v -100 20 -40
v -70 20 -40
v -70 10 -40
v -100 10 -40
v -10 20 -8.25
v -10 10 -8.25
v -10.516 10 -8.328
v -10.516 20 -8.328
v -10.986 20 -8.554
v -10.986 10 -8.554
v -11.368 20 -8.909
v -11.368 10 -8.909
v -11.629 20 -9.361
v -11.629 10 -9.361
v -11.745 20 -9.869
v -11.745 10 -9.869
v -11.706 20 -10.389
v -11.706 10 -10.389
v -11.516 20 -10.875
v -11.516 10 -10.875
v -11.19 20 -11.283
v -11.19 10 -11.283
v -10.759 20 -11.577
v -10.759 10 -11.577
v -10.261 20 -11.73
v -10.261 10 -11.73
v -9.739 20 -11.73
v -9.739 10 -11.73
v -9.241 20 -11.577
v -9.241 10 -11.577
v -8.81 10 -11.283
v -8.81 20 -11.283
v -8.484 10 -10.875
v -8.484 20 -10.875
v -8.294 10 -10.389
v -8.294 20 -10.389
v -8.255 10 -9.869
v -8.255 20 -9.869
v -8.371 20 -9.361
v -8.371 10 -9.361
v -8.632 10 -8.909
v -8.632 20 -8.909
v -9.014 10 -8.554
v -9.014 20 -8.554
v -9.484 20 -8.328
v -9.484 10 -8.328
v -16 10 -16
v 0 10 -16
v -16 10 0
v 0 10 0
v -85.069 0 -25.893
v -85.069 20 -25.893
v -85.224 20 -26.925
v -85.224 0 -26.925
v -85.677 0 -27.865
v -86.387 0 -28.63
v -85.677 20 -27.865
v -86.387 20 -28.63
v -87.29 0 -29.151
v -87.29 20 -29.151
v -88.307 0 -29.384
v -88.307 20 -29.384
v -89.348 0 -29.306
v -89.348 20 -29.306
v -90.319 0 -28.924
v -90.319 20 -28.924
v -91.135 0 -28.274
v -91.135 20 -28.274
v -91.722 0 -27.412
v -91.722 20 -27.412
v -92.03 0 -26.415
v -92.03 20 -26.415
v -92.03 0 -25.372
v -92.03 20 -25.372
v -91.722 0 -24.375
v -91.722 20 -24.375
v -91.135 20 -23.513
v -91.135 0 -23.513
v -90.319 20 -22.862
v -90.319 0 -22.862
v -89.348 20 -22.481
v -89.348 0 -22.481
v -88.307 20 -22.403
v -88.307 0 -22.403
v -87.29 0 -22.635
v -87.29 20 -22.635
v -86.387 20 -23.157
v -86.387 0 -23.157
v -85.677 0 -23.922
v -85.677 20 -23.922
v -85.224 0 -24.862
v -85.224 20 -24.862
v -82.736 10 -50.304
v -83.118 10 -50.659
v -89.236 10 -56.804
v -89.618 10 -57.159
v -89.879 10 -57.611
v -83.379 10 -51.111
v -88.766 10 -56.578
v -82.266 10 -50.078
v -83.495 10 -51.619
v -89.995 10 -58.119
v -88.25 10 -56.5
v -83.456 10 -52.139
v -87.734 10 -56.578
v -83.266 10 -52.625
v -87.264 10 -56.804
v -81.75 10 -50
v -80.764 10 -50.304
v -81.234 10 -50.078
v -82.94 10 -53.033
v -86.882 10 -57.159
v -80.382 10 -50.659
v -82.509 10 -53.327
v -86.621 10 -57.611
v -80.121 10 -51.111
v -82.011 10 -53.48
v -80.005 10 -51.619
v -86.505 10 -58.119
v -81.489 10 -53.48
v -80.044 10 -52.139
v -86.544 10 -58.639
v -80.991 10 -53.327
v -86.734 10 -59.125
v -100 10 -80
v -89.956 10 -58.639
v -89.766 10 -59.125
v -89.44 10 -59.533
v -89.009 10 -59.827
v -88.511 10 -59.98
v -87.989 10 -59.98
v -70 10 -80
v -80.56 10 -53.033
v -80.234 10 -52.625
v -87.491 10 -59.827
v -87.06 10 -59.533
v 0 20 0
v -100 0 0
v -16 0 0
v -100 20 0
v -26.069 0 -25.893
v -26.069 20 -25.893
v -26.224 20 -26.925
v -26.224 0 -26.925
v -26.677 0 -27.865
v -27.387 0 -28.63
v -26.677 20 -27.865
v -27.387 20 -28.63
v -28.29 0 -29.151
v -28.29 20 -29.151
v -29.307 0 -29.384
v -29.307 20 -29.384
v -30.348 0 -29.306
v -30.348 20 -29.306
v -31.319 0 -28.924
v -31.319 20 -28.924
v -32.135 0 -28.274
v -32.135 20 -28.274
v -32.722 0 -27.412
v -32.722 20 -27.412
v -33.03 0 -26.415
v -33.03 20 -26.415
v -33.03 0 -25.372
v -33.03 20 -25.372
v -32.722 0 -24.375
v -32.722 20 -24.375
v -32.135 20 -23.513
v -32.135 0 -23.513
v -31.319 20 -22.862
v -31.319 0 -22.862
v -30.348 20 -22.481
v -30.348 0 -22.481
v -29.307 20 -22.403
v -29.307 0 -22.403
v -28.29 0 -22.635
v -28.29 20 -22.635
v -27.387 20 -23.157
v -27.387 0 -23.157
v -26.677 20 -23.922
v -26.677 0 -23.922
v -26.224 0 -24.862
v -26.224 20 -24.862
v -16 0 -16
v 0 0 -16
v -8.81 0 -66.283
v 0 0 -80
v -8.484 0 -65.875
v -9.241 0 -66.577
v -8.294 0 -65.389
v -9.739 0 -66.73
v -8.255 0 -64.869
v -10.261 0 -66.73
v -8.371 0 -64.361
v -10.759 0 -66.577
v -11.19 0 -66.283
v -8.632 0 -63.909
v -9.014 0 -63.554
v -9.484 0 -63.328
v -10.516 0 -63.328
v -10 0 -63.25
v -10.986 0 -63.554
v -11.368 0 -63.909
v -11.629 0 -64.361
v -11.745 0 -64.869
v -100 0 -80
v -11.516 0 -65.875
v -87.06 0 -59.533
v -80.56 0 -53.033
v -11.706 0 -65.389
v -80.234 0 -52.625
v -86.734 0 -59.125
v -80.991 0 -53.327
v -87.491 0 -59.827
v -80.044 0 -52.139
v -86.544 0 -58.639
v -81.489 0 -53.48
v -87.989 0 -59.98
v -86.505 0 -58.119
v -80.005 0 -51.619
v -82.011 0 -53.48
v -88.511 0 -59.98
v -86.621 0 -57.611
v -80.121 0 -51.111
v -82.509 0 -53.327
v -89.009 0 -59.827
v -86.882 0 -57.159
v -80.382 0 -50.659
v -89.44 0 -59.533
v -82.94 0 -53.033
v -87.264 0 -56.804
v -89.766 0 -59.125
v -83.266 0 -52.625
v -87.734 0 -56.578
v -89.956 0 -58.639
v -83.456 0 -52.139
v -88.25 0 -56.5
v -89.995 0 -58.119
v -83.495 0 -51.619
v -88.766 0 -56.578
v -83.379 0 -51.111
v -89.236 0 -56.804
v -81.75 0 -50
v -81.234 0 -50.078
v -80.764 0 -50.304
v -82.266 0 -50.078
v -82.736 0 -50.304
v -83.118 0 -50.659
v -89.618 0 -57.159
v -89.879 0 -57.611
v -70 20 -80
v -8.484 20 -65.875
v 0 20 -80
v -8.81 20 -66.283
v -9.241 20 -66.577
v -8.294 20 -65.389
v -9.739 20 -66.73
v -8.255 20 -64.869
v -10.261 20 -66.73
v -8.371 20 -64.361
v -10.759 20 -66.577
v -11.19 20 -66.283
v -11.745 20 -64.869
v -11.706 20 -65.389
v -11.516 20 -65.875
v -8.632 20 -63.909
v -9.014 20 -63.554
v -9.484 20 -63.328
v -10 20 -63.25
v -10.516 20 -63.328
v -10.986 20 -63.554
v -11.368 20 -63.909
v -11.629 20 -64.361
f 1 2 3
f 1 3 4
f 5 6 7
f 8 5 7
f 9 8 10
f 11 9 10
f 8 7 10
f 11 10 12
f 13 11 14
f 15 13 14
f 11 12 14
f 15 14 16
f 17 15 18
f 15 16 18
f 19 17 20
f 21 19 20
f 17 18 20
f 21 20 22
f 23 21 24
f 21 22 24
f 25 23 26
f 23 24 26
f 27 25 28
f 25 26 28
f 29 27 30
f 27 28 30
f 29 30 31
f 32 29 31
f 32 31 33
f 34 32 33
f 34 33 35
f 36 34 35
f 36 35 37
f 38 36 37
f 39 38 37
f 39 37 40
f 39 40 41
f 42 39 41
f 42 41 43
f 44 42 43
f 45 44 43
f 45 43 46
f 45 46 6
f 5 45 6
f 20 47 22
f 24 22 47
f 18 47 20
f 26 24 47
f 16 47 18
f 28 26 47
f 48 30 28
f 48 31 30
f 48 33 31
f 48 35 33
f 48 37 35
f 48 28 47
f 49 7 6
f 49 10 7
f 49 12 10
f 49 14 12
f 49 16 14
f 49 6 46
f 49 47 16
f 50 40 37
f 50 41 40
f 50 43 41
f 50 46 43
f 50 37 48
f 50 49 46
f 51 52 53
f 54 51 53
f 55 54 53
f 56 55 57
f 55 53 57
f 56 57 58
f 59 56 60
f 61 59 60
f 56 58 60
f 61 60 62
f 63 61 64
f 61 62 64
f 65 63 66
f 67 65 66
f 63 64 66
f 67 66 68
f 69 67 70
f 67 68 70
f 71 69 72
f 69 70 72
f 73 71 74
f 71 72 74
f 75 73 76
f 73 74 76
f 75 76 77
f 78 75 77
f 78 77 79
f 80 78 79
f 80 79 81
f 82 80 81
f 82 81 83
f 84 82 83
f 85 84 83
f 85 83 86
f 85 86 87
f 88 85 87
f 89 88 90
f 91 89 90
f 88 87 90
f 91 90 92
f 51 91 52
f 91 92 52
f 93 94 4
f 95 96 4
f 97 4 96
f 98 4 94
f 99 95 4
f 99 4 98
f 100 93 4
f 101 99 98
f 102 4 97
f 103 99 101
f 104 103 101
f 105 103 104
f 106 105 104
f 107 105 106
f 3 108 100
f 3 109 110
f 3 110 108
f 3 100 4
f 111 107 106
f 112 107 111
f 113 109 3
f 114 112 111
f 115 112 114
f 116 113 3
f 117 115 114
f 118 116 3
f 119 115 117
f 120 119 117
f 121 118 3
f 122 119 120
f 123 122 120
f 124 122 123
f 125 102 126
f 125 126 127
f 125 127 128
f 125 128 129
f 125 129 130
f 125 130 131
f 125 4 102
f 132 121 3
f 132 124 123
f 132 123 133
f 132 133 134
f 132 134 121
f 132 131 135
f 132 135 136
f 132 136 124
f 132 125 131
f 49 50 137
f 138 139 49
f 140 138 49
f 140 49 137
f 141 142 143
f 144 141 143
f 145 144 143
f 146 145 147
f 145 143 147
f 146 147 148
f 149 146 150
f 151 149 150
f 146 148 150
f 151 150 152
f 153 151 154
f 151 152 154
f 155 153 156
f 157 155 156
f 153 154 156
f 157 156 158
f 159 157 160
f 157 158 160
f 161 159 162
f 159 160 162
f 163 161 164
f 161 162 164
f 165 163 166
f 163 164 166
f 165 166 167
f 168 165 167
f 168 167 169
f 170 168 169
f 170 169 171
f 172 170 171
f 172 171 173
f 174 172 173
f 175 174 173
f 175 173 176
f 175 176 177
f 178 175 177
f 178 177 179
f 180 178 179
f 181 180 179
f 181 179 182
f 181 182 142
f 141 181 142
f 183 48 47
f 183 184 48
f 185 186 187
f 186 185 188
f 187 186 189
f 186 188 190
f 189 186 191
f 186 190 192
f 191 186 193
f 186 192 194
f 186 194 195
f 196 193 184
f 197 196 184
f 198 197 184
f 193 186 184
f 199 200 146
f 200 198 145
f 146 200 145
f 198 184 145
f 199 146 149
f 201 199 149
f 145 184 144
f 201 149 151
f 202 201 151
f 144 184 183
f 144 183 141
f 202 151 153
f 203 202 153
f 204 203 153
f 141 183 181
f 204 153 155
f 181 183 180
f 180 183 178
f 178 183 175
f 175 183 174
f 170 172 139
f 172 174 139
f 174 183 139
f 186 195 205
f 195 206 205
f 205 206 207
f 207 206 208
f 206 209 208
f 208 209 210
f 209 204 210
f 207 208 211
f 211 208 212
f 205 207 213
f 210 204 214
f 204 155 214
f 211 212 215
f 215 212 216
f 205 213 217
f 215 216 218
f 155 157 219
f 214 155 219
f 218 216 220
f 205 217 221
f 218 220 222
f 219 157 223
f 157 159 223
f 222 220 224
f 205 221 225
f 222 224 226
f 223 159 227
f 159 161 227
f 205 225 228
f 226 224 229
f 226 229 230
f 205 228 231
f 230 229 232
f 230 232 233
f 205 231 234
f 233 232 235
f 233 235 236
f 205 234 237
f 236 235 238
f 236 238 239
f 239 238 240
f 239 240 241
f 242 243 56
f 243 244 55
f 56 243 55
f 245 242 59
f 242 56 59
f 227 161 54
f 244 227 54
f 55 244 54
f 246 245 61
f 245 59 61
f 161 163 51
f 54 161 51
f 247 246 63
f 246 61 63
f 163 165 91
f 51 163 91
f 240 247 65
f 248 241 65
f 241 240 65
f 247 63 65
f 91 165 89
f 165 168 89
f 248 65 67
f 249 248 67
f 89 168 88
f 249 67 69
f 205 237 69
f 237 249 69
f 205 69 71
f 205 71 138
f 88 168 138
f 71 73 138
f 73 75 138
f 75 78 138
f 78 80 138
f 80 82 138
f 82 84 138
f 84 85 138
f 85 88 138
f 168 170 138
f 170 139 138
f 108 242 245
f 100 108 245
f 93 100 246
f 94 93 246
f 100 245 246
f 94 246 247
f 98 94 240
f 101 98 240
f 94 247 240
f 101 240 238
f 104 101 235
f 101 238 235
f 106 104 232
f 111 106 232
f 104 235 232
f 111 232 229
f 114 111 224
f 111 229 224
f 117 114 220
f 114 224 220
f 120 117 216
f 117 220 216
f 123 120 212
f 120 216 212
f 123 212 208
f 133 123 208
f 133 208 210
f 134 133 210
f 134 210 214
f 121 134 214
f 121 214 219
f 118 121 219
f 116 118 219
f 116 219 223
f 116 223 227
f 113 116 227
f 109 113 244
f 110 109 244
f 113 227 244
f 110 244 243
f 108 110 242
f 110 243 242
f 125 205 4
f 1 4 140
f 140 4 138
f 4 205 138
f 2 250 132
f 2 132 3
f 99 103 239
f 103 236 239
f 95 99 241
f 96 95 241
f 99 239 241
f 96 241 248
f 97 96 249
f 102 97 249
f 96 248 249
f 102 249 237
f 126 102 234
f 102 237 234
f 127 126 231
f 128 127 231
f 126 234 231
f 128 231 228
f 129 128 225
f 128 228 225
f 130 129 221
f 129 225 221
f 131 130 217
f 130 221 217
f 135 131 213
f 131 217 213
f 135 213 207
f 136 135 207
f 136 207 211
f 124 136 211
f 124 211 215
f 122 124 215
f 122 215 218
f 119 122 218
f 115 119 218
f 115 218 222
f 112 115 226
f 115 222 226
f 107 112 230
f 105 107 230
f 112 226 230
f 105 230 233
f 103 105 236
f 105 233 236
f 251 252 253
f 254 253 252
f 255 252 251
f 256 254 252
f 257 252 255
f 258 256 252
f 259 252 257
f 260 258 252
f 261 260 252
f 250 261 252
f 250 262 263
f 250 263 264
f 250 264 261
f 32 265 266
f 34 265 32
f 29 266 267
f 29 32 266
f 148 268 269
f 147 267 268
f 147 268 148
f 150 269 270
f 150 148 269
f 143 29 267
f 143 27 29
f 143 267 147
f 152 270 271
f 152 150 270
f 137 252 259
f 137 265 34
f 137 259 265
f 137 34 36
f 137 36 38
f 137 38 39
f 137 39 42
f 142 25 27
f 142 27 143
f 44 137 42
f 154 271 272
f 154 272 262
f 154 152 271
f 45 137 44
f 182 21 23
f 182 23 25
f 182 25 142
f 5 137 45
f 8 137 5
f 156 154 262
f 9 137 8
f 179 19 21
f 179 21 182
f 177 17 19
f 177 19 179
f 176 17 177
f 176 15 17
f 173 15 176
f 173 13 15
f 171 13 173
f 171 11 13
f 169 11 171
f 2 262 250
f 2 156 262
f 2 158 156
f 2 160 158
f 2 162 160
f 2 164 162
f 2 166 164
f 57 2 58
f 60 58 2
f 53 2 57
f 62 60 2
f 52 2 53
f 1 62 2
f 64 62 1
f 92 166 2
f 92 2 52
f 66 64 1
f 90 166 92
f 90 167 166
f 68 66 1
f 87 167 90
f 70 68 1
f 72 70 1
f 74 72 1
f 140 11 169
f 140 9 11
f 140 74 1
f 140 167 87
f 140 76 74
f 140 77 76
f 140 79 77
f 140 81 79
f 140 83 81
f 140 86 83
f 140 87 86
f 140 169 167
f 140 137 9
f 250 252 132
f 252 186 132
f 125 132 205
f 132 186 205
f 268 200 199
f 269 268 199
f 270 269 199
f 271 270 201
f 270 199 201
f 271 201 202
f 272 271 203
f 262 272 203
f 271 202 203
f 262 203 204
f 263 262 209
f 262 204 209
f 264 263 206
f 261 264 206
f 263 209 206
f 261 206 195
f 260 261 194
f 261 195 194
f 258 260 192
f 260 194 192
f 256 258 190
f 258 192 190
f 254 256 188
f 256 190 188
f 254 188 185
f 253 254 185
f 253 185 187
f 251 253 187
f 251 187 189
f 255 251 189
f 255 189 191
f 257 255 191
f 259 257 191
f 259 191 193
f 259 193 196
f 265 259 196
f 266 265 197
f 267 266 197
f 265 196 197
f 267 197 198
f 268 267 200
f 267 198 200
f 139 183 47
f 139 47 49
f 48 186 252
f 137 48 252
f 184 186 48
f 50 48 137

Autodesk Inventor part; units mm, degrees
ref_plane "YZ Plane" through (0, 0, 0) normal (1, 0, 0) x (0, 1, 0)
ref_plane "XZ Plane" through (0, 0, 0) normal (0, 1, 0) x (-1, 0, 0)
ref_plane "XY Plane" through (0, 0, 0) normal (0, 0, 1) x (1, 0, 0)
sketch "Boceto1" plane through (0, 0, 0) normal (0, 1, 0) x (-1, 0, 0)
  line L0 (100, 80) -> (-100, 80)
  line L1 (-100, 80) -> (-100, -80)
  line L2 (-100, -80) -> (100, -80)
  line L3 (100, -80) -> (100, 80)
  line L4 (100, 80) -> (-100, -80) construction
  line L5 (-100, 80) -> (100, -80) construction
  point P0 (0, 0)
  dimension "d0" = 200
  dimension "d1" = 160
extrude "Extrusión1" add sketch "Boceto1" along normal blind 20
sketch "Boceto2" plane through (0, 20, 0) normal (0, 1, 0) x (1, 0, 0)
  line L0 (-100, 80) -> (-100, -80) projected
  line L1 (-100, 80) -> (-70, 80)
  line L2 (-70, 80) -> (-70, 40)
  line L3 (-70, 40) -> (-100, 40)
  line L4 (-100, 40) -> (-100, 80)
  line L5 (100, 80) -> (-100, 80) projected
  line L6 (0, 80) -> (0, 40)
  line L7 (100, 80) -> (70, 80)
  line L8 (70, 80) -> (70, 40)
  line L9 (70, 40) -> (100, 40)
  line L10 (100, 40) -> (100, 80)
  point P0 (0, 0)
  dimension "d4" = 30
  dimension "d5" = 40
extrude "Extrusión2" cut sketch "Boceto2" against normal blind 10
sketch "Boceto3" plane through (0, 20, 0) normal (0, 1, 0) x (1, 0, 0)
  line L0 (-70, 80) -> (-70, 40) projected
  line L1 (-70, 80.0001) -> (-70, 40)
  line L2 (-70, 40) -> (-100, 40) projected
  line L3 (-100, 40) -> (-100, 80.0001)
  line L4 (-100, 40) -> (-70, 40)
  line L5 (-70, 40) -> (-70, 80)
  line L6 (-70, 80) -> (-100, 80)
  line L7 (-100, 80) -> (-100, 40)
  circle A0 centre (-88.25, 58.25) radius 1.75
  circle A1 centre (-81.75, 51.75) radius 1.75
  line L8 (100, 80) -> (-100, 80) projected
  line L9 (0, 80) -> (0, 56.5)
  circle A2 centre (88.25, 58.25) radius 1.75
  circle A3 centre (81.75, 51.75) radius 1.75
  point P0 (0, 0)
  point P1 (-64.3507, 80)
  point P2 (-74.3507, 0)
  point P3 (-85, 80)
  dimension "d23" = 21.75
  dimension "d24" = 11.75
  dimension "d26" = 11.75
hole "Agujero1" at (-81.75, 20, -51.75) at (-88.25, 20, -58.25) at (81.75, 20, -51.75) at (88.25, 20, -58.25) direction (0, -1, 0) diameter 3.5 end through all
sketch "Boceto4" plane through (-100, 0, 80) normal (0, 0, 1) x (1, 0, 0)
  line L0 (30, 20) -> (60, 20)
  line L1 (60, 20) -> (60, 10)
  line L2 (60, 10) -> (30, 10)
  line L3 (30, 10) -> (30, 20)
  line L4 (0, 0) -> (0, 20) projected
  line L5 (100, 0) -> (100, 10)
  line L6 (170, 20) -> (140, 20)
  line L7 (140, 20) -> (140, 10)
  line L8 (140, 10) -> (170, 10)
  line L9 (170, 10) -> (170, 20)
  dimension "d34" = 30
  dimension "d35" = 10
  dimension "d36" = 30
extrude "Extrusión3" add sketch "Boceto4" along normal blind 40
sketch "Boceto5" plane through (0, 20, 0) normal (0, 1, 0) x (1, 0, 0)
  line L0 (59.9999, -50) -> (69.9999, -50)
  line L1 (49.9999, -101.75) -> (49.9999, -79.9497)
  line L2 (59.9999, -108.25) -> (59.9999, -50)
  line L3 (40, -80) -> (69.9999, -80)
  line L4 (49.9999, -79.9497) -> (40, -80)
  circle A0 centre (51.7499, -101.75) radius 1.75
  circle A1 centre (58.2499, -108.25) radius 1.75
  line L5 (69.9999, -80) -> (69.9999, -120)
  line L6 (40, -120) -> (40, -80)
  line L7 (69.9999, -120) -> (40, -120)
  line L8 (0, -50) -> (0, -71.75)
  line L9 (-40, -120) -> (-40, -80)
  line L10 (-49.9999, -101.75) -> (-49.9999, -79.9497)
  circle A2 centre (-51.7499, -101.75) radius 1.75
  circle A3 centre (-58.2499, -108.25) radius 1.75
  line L11 (-40, -80) -> (-69.9999, -80)
  line L12 (-69.9999, -120) -> (-40, -120)
  line L13 (-69.9999, -80) -> (-69.9999, -120)
  line L14 (-59.9999, -108.25) -> (-59.9999, -50)
  line L15 (-40, -120) -> (-69.9999, -120)
  line L16 (-69.9999, -80) -> (-69.9999, -120)
  line L17 (-40, -120) -> (-70, -120) projected
  line L18 (-40, -80) -> (-40, -120) projected
  line L19 (-59.9999, -110) -> (-49.9999, -110)
  line L20 (-49.9999, -110) -> (-49.9999, -100)
  line L21 (-49.9999, -100) -> (-59.9999, -100)
  line L22 (-59.9999, -100) -> (-59.9999, -110)
  line L23 (-100, 40) -> (-100, -80) projected
  point P0 (0, 0)
  point P1 (-56.75, -68.25)
  point P2 (-63.25, -61.75)
  point P3 (63.25, -61.75)
  point P4 (56.75, -68.25)
  dimension "d45" = 3.5
  dimension "d46" = 3.5
  dimension "d39" = 10
  dimension "d40" = 10
  dimension "d41" = 40
  dimension "d42" = 0
  dimension "d43" = 6.5
  dimension "d44" = 6.5
  dimension "d47" = 11.7499
  dimension "d48" = 11.75
  dimension "d49" = 0
  dimension "d50" = 11.75
  dimension "d51" = 0
  dimension "d97" = 40.0001
hole "Agujero2" at (-58.2499, 20, 108.25) at (-51.7499, 20, 101.75) at (51.7499, 20, 101.75) at (58.2499, 20, 108.25) direction (0, -1, 0) diameter 3.5 end through all
sketch "Boceto6" plane through (0, 20, 0) normal (0, 1, 0) x (1, 0, 0)
  circle A0 centre (-60.569, -13.1067) radius 10
  circle A1 centre (-29.569, -59.1067) radius 3.5
  line L0 (-60.569, -13.1067) -> (-39.0083, -13.1067)
  circle A2 centre (-29.569, 25.8933) radius 3.5
  circle A3 centre (-88.569, 25.8933) radius 3.5
  circle A4 centre (-88.569, -59.1067) radius 3.5
  line L1 (70.4544, -63.0517) -> (18.4544, -63.0517)
  line L2 (18.4544, -63.0517) -> (18.4544, 6.9483)
  line L3 (18.4544, 6.9483) -> (70.4544, 6.9483)
  line L4 (70.4544, 6.9483) -> (70.4544, -63.0517)
  line L5 (70.4544, 6.9483) -> (48.4544, 6.9483)
  line L6 (48.4544, 6.9483) -> (48.4544, 48.9483)
  line L7 (48.4544, 48.9483) -> (70.4544, 48.9483)
  line L8 (70.4544, 48.9483) -> (70.4544, 6.9483)
  line L9 (77.2288, -8.158) -> (77.2281, -5.6604)
  circle A5 centre (63.7706, -5.7606) radius 1.75
  line L10 (70.7641, -24.1464) -> (70.7641, 22.2796)
  circle A6 centre (35.8307, -5.7609) radius 1.75
  line L11 (25.1581, -13.2381) -> (25.1581, -10.7404)
  circle A7 centre (68.8507, -57.8309) radius 1.75
  line L12 (26.4277, 35.0051) -> (26.4277, 37.5029)
  circle A8 centre (20.6074, -56.5614) radius 1.75
  line L13 (18.6941, -55.9176) -> (70.7641, -55.9176)
  line L14 (18.6941, -55.9176) -> (18.6941, -7.6743)
  line L15 (44.7291, -55.9176) -> (44.7291, -31.7959)
  line L16 (63.7706, -28.0517) -> (26.4277, -28.0517)
  line L17 (44.7291, -23.5247) -> (44.7291, -31.7959)
  point P0 (0, 0)
  point P1 (-60.569, -16.6067)
  point P2 (45.425, 12.8886)
  point P3 (44.7291, -28.0517)
  dimension "d59" = 7
  dimension "d60" = 7
  dimension "d61" = 7
  dimension "d62" = 39
  dimension "d63" = 46
  dimension "d64" = 59
  dimension "d65" = 46
  dimension "d66" = 39
  dimension "d67" = 59
  dimension "d68" = 52
  dimension "d69" = 70
  dimension "d70" = 22
  dimension "d71" = 42
  dimension "d72" = 3.5
  dimension "d73" = 3.5
  dimension "d74" = 3.5
  dimension "d75" = 3.5
  dimension "d142" = 17.3763
  dimension "d143" = 12.7092
  dimension "d144" = 6.6837
  dimension "d145" = 12.7089
  dimension "d146" = 5.2208
  dimension "d147" = 1.6037
  dimension "d148" = 2.1531
  dimension "d149" = 6.4903
hole "Agujero3" at (68.8507, 20, 57.8309) at (20.6074, 20, 56.5614) at (63.7706, 20, 5.7606) at (35.8307, 20, 5.7609) direction (0, -1, 0) diameter 3.5 end through all
sketch "Boceto7" plane through (0, 20, 0) normal (0, 1, 0) x (1, 0, 0)
  circle A0 centre (-60.569, -13.1067) radius 10
  circle A1 centre (-29.569, -59.1067) radius 3.5
  line L0 (-60.569, -13.1067) -> (-39.0083, -13.1067)
  circle A2 centre (-29.569, 25.8933) radius 3.5
  circle A3 centre (-88.569, 25.8933) radius 3.5
  circle A4 centre (-88.569, -59.1067) radius 3.5
  point P0 (0, 0)
  point P1 (-60.569, -16.6067)
  dimension "d83" = 7
  dimension "d84" = 7
  dimension "d85" = 7
  dimension "d86" = 39
  dimension "d87" = 46
  dimension "d88" = 59
  dimension "d89" = 46
  dimension "d90" = 39
  dimension "d91" = 59
extrude "Extrusión4" cut sketch "Boceto7" against normal blind 20
ref_plane "Plano de trabajo1" through (0, 0, -80) normal (-1, 0, 0) x (0, 0, 1)
ref_plane "Plano de trabajo2" through (100, 0, 0) normal (0, 0, -1) x (-1, 0, 0)
sketch "Boceto8" plane through (0, 20, 0) normal (0, 1, 0) x (1, 0, 0)
  line L0 (80, -15) -> (90, -15)
  circle A0 centre (85, -10) radius 1.75
  line L1 (85, 10) -> (85, -10)
  line L2 (90, -15) -> (90, 15)
  circle A1 centre (85, 10) radius 1.75
  line L3 (80, 15) -> (80, -15)
  line L4 (90, 15) -> (80, -15) construction
  line L5 (80, 15) -> (90, -15) construction
  line L6 (90, 15) -> (80, 15)
  line L7 (100, -80) -> (100, 40) projected
  line L8 (0, 0) -> (20, -20)
  line L9 (0, 0) -> (28.2843, 0) construction
  line L10 (15, -60) -> (15, -70)
  circle A2 centre (10, -65) radius 1.75
  line L11 (-10, -65) -> (10, -65)
  line L12 (15, -70) -> (-15, -70)
  circle A3 centre (-10, -65) radius 1.75
  line L13 (-15, -60) -> (15, -60)
  line L14 (-15, -70) -> (15, -60) construction
  line L15 (-15, -60) -> (15, -70) construction
  line L16 (-15, -70) -> (-15, -60)
  line L17 (0, 0) -> (18.6615, 18.6615)
  line L18 (0, 0) -> (26.3913, 0) construction
  line L19 (-15, 60) -> (-15, 70)
  circle A4 centre (-10, 65) radius 1.75
  line L20 (10, 65) -> (-10, 65)
  line L21 (-15, 70) -> (15, 70)
  circle A5 centre (10, 65) radius 1.75
  line L22 (15, 60) -> (-15, 60)
  line L23 (15, 70) -> (-15, 60) construction
  line L24 (15, 60) -> (-15, 70) construction
  line L25 (15, 70) -> (15, 60)
  line L26 (70, 80) -> (-70, 80) projected
  line L27 (-40, -80) -> (40, -80) projected
  point P0 (86.9608, 0)
  point P1 (86.9608, 0)
  point P2 (85, 15)
  point P3 (0, -69.1269)
  point P4 (0, -69.1269)
  point P5 (-15, -67.1661)
  point P6 (0, 69.7066)
  point P7 (0, 69.7066)
  point P8 (15, 67.7458)
  point P9 (-15, 65)
  point P10 (15, -65)
  dimension "d98" = 10
  dimension "d99" = 30
  dimension "d100" = 10
  dimension "d101" = 5
  dimension "d102" = 5
  dimension "d103" = 5
  dimension "d104" = 5
  dimension "d105" = 45
  dimension "d106" = 45
  dimension "d107" = 10
  dimension "d108" = 10
  dimension "d109" = 30
  dimension "d110" = 5
  dimension "d111" = 5
  dimension "d112" = 5
  dimension "d113" = 5
  dimension "d114" = 10
  dimension "d115" = 30
  dimension "d116" = 5
  dimension "d117" = 5
  dimension "d118" = 5
  dimension "d119" = 5
  dimension "d120" = 10
hole "Agujero4" at (-10, 20, -65) at (10, 20, -65) at (85, 20, -10) at (85, 20, 10) at (10, 20, 65) at (-10, 20, 65) direction (0, -1, 0) diameter 3.5 end through all
sketch "Boceto9" plane through (0, 20, 0) normal (0, 1, 0) x (1, 0, 0)
  circle A0 centre (10, -10) radius 1.75
  line L0 (6.803, 0) -> (14.6069, 0)
  line L1 (0, 0) -> (0, -4.8284)
  line L2 (0, 0) -> (20.0354, 0)
  circle A1 centre (10, 10) radius 1.75
  line L3 (0, 0) -> (0, 4.8284)
  circle A2 centre (-10, 10) radius 1.75
  circle A3 centre (-10, -10) radius 1.75
  dimension "d128" = 3.5
  dimension "d129" = 10
  dimension "d130" = 10
hole "Agujero5" at (-10, 20, 10) at (-10, 20, -10) at (10, 20, -10) at (10, 20, 10) direction (0, -1, 0) diameter 3.5 end through all
sketch "Boceto10" plane through (0, 0, 0) normal (0, -1, 0) x (1, 0, 0)
  line L0 (-16, 16) -> (16, 16)
  line L1 (16, 16) -> (16, -16)
  line L2 (16, -16) -> (-16, -16)
  line L3 (-16, -16) -> (-16, 16)
  line L4 (-16, 16) -> (16, -16) construction
  line L5 (16, 16) -> (-16, -16) construction
  point P0 (0, 0)
  point P1 (0, 0)
  dimension "d138" = 32
  dimension "d139" = 32
extrude "Extrusión5" cut sketch "Boceto10" against normal blind 10
split "Dividir1" plane through (100, 0, 0) removes the side toward (0, 0, 1)
split "Dividir2" plane through (0, 0, -80) removes the side toward (1, 0, 0)
properties part number "base_mid_1"
